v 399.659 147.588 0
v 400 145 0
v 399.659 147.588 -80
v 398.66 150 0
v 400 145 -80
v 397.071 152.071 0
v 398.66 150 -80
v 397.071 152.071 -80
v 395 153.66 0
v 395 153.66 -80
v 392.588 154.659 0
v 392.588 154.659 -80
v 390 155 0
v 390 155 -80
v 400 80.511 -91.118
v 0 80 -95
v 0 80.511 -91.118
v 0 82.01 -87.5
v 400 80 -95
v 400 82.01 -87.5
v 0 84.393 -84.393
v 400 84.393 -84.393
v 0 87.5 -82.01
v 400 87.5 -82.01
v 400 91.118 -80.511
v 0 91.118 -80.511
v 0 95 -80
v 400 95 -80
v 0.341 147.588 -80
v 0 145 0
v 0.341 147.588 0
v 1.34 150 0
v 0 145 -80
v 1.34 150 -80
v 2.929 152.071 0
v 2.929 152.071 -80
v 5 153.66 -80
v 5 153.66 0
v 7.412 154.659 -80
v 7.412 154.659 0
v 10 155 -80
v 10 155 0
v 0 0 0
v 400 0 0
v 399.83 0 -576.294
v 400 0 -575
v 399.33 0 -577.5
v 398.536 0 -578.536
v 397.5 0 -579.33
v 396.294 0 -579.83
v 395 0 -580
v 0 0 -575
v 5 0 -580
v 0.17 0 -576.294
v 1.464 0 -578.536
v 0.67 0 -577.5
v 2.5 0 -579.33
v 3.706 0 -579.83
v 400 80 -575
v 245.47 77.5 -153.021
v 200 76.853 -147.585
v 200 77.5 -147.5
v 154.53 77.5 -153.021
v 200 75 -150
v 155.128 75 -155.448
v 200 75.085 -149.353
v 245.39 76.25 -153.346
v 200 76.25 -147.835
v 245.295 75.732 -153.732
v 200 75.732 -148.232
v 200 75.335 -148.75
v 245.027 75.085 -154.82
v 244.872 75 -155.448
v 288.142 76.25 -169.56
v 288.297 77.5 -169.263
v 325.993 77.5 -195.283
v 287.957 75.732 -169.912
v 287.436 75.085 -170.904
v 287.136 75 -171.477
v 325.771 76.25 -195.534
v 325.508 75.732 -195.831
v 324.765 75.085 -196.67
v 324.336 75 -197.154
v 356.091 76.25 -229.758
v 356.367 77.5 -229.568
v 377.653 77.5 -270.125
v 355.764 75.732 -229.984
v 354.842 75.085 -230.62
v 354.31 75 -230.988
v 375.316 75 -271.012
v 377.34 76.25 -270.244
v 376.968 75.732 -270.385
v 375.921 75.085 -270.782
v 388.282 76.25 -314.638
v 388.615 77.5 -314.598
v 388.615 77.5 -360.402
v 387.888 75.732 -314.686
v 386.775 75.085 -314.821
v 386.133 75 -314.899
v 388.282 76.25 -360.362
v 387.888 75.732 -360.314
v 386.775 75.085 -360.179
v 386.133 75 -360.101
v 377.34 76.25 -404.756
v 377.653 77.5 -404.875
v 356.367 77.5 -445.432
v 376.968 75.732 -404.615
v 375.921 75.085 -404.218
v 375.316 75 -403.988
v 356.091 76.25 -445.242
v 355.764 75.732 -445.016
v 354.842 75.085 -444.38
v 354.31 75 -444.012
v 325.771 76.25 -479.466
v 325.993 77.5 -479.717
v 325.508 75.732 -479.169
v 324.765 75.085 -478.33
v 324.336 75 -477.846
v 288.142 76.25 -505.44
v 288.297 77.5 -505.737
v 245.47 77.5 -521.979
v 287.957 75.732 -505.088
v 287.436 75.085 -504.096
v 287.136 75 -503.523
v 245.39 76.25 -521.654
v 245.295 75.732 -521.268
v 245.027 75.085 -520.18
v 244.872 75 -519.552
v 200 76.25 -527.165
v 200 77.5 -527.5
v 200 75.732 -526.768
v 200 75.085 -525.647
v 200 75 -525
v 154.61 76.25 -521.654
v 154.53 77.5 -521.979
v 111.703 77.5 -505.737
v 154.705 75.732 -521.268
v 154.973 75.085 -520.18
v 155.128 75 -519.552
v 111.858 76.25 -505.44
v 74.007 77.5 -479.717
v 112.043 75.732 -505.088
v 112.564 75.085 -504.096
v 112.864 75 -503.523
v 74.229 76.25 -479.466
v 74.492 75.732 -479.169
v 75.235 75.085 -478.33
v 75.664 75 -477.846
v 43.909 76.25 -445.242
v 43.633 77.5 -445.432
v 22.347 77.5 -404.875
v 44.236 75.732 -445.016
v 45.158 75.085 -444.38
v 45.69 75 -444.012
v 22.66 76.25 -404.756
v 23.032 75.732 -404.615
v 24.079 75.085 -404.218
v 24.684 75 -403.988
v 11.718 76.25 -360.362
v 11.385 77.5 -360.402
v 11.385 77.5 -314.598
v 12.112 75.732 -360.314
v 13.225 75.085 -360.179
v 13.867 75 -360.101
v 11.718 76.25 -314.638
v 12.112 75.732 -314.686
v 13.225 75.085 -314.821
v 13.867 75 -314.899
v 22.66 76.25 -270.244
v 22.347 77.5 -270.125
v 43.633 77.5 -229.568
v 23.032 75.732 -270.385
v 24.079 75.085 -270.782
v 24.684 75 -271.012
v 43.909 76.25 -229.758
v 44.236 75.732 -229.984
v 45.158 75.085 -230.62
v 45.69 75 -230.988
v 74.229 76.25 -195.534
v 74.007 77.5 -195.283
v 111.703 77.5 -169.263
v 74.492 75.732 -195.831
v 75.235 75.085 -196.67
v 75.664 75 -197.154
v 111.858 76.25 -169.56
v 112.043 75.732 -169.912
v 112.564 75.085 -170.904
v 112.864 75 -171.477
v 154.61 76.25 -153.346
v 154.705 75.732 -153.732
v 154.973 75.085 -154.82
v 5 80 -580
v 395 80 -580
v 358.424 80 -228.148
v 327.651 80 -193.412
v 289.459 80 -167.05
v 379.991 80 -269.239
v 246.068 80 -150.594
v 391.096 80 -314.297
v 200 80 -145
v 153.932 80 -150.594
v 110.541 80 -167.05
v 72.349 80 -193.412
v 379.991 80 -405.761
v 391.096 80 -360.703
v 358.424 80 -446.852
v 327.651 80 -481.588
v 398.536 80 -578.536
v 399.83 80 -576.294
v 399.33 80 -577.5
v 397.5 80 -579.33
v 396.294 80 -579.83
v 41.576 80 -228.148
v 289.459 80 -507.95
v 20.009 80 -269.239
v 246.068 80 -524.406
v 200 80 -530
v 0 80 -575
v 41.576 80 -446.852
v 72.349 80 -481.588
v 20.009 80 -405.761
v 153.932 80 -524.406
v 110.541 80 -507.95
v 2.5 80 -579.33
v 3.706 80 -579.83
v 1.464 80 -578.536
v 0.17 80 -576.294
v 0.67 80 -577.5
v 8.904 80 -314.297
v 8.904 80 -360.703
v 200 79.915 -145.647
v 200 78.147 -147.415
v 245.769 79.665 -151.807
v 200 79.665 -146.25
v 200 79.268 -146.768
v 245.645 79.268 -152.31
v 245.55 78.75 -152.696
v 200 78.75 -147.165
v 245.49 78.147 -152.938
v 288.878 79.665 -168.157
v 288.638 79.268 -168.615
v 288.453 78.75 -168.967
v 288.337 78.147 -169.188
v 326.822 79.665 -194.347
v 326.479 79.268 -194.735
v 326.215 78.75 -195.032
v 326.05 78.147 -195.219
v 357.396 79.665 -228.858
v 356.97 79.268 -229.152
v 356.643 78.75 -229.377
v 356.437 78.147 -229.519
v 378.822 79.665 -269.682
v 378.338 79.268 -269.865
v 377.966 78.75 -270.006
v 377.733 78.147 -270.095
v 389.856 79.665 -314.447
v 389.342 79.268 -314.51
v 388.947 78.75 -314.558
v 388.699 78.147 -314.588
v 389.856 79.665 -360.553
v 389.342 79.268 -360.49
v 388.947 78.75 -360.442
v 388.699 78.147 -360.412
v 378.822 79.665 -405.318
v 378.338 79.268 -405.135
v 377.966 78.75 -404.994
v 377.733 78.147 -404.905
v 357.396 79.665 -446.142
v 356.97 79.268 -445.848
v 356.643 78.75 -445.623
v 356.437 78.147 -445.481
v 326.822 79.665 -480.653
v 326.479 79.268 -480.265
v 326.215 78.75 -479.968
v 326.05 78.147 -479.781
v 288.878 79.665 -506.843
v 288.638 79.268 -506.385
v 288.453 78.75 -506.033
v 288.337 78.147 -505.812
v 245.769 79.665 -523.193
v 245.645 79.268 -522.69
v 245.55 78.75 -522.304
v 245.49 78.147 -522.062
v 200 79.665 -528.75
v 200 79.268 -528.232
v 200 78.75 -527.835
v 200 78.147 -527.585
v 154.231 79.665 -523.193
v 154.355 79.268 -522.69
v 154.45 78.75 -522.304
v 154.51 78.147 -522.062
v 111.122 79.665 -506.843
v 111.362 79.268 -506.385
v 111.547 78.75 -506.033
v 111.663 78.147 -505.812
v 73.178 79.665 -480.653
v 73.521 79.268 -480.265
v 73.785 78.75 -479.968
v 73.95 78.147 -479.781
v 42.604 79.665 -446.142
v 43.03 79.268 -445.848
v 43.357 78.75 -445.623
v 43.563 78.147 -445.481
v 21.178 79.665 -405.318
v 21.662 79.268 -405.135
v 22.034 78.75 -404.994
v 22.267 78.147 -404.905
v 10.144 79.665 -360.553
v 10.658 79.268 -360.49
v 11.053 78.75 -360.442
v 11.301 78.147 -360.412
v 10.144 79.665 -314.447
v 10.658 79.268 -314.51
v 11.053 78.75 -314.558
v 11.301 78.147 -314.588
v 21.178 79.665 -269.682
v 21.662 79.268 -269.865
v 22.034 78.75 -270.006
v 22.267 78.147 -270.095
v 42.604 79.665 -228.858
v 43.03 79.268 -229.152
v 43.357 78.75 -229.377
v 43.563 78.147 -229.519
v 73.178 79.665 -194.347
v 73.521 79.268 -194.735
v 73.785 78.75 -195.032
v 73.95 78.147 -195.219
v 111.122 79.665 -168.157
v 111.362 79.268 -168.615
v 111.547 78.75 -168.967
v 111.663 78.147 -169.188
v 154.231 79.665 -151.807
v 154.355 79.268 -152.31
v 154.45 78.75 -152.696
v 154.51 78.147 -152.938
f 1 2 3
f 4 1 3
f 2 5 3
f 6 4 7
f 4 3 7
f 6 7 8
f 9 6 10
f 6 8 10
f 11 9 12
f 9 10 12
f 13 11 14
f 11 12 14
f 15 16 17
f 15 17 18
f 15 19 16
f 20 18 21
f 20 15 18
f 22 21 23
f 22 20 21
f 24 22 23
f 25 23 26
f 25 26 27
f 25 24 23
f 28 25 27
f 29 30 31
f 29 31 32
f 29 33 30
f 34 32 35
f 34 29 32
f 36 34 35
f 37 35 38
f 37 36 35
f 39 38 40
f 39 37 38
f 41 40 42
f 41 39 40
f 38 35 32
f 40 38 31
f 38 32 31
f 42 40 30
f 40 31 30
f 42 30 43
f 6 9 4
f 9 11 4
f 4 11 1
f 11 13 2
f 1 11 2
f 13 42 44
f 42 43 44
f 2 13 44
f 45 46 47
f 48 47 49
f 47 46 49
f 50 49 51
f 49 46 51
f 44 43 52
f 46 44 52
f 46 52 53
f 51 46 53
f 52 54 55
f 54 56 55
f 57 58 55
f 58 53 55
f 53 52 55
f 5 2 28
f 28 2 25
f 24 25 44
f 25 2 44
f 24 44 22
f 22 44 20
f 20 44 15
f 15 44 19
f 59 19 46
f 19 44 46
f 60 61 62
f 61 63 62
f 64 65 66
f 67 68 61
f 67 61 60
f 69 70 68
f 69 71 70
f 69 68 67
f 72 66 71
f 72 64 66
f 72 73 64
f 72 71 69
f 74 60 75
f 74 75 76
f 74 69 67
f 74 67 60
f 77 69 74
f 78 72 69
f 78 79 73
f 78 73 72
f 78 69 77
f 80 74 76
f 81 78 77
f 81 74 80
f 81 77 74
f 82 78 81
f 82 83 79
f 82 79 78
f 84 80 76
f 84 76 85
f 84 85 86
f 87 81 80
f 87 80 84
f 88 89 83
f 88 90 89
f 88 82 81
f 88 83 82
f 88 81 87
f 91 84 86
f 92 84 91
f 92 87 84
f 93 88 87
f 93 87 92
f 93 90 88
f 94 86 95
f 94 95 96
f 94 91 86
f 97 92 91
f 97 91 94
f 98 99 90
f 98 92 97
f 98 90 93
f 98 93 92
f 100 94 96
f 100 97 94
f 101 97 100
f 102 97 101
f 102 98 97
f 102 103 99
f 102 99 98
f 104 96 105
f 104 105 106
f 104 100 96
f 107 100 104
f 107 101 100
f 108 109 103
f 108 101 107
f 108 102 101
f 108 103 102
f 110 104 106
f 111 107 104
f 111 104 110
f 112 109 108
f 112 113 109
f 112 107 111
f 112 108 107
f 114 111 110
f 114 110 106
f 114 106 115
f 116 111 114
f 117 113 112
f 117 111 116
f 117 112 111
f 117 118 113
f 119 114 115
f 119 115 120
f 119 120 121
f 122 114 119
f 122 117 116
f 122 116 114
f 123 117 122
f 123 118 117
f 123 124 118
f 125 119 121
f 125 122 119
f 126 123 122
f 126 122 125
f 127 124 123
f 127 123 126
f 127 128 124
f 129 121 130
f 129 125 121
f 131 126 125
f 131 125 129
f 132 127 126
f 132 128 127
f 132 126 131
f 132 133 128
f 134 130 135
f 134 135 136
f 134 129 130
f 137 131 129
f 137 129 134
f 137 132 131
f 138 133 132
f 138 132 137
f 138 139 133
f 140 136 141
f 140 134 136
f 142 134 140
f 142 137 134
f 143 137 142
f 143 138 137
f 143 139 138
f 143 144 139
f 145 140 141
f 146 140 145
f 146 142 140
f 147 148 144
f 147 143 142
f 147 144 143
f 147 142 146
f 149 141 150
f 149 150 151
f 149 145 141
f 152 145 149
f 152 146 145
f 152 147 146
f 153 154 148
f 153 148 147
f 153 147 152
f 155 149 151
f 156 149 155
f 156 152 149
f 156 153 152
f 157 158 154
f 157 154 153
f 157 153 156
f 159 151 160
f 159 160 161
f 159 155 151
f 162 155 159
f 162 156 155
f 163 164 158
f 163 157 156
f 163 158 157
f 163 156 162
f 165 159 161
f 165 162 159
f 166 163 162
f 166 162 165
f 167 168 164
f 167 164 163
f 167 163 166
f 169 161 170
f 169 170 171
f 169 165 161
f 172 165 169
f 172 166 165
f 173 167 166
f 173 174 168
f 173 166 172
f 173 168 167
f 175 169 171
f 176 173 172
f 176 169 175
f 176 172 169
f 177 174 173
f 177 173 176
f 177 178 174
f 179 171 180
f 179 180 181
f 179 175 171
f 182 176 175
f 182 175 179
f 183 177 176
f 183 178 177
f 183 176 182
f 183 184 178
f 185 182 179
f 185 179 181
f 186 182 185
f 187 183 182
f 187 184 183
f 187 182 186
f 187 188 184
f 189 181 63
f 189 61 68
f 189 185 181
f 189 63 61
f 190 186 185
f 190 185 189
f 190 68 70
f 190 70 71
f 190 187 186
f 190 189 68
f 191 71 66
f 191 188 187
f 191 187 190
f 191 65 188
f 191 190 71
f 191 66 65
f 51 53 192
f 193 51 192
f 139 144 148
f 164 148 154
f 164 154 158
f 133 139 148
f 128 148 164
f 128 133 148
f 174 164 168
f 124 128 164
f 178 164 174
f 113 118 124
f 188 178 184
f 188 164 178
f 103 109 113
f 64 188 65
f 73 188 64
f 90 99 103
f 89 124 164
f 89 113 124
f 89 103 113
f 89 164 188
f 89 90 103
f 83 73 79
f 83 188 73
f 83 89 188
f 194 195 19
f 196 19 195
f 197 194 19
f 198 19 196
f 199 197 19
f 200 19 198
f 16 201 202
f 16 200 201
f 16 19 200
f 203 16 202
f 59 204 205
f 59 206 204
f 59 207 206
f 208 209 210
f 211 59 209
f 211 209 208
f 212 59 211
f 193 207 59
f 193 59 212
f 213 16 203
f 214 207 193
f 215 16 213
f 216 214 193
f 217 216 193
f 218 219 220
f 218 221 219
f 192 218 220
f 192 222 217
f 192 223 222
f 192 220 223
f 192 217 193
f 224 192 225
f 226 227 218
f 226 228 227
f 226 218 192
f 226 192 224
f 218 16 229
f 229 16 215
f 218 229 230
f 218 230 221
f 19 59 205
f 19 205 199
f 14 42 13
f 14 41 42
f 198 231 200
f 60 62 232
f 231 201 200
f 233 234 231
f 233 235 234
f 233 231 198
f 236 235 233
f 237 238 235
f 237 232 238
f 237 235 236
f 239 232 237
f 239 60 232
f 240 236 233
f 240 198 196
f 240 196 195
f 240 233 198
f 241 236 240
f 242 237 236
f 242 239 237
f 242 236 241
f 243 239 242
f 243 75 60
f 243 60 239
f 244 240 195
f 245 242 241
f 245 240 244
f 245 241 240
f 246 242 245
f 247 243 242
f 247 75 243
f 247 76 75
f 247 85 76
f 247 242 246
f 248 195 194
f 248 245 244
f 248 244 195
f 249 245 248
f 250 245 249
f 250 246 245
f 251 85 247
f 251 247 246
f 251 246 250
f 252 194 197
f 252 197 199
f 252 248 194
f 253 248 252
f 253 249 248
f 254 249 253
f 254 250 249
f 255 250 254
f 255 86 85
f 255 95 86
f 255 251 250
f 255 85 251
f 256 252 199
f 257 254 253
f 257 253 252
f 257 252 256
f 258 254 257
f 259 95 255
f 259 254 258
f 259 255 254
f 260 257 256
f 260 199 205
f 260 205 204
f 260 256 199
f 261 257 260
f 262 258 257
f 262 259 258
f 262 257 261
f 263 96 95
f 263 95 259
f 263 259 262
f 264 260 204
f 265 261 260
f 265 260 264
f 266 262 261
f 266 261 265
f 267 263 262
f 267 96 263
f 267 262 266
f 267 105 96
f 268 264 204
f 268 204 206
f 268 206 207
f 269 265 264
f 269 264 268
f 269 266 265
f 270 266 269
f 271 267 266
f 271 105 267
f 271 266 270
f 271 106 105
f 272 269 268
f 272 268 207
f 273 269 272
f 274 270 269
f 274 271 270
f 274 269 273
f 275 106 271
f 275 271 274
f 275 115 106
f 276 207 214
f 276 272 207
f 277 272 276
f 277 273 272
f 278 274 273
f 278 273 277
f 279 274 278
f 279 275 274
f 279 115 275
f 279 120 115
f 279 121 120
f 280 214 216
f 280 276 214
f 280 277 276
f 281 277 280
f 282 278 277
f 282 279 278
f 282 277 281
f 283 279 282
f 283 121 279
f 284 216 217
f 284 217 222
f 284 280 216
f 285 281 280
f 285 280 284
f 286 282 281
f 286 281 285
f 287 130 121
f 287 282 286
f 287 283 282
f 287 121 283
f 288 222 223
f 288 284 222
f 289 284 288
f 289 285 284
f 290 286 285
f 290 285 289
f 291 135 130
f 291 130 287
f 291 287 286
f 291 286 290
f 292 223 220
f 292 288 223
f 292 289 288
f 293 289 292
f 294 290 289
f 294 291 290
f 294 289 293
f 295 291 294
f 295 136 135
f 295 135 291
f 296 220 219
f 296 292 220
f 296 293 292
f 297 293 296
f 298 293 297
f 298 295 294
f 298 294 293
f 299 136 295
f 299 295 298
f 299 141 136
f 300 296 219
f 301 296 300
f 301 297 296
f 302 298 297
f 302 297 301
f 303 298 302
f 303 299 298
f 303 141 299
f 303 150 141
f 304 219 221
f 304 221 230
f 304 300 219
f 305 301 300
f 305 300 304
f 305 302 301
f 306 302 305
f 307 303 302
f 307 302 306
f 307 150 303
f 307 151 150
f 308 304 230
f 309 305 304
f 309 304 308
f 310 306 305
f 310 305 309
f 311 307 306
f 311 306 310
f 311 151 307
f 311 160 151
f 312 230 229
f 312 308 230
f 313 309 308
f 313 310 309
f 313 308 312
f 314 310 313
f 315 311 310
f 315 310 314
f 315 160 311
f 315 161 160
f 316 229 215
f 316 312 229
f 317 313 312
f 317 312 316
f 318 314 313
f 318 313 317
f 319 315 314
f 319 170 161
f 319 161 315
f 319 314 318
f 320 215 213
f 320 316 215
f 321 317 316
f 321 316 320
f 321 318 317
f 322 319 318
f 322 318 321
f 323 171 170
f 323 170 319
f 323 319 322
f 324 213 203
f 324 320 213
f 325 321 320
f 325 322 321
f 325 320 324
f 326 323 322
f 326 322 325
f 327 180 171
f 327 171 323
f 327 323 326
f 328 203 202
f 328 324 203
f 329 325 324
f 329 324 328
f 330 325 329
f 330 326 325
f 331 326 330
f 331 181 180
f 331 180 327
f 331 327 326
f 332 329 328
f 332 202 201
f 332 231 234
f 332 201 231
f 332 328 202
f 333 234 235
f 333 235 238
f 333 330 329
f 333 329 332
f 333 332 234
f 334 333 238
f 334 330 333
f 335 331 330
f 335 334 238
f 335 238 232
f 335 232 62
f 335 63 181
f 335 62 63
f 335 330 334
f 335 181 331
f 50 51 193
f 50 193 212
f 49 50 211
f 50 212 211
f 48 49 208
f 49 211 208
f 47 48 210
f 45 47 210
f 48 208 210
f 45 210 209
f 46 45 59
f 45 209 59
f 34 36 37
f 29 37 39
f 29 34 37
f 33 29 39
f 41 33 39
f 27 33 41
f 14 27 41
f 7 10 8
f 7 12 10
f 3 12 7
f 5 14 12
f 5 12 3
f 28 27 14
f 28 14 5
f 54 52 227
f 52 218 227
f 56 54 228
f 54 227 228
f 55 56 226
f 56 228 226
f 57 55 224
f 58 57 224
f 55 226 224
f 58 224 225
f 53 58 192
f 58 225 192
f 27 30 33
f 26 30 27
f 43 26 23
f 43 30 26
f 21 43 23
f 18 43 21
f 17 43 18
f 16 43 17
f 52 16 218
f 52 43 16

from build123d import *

# Parameters (mm, degrees)
SKETCH1_W           = 580
SKETCH1_H           = 80
BOSS_EXTRUDE1_DEPTH = 400
SKETCH2_W           = 400
SKETCH2_H           = 80
BOSS_EXTRUDE2_DEPTH = 75
FILLET2_R           = 10
FILLET3_R           = 5
FILLET4_R           = 15
SKETCH3_R           = 190
CUT_EXTRUDE1_DEPTH  = 5
FILLET6_R           = 2.5


with BuildPart() as part:
    # Sketch1 → Boss-Extrude1 (new body)
    with BuildSketch(Plane(origin=(0, 0, 0), x_dir=(0, 0, -1), z_dir=(1, 0, 0))):
        with Locations((290, 40)):
            Rectangle(SKETCH1_W, SKETCH1_H)
    extrude(amount=BOSS_EXTRUDE1_DEPTH)

    # Sketch2 → Boss-Extrude2 (add)
    with BuildSketch(Plane(origin=(0, 80, 0), x_dir=(1, 0, 0), z_dir=(0, 1, 0))):
        with Locations((200, 40)):
            Rectangle(SKETCH2_W, SKETCH2_H)
    extrude(amount=BOSS_EXTRUDE2_DEPTH)

    # Fillet2
    fillet2_edges = [part.edges().sort_by_distance(p)[0] for p in [
        (0, 155, -40),
        (400, 155, -40),
    ]]
    fillet(fillet2_edges, radius=FILLET2_R)

    # Fillet3
    fillet3_edges = [part.edges().sort_by_distance(p)[0] for p in [
        (400, 40, -580),
        (0, 40, -580),
    ]]
    fillet(fillet3_edges, radius=FILLET3_R)

    # Fillet4
    fillet4_edges = [part.edges().sort_by_distance(p)[0] for p in [
        (200, 80, -80),
    ]]
    fillet(fillet4_edges, radius=FILLET4_R)

    # Sketch3 → Cut-Extrude1 (cut)
    with BuildSketch(Plane(origin=(0, 80, 0), x_dir=(1, 0, 0), z_dir=(0, 1, 0))):
        with Locations(Location((200, 337.5, 0), (0, 0, 270))):
            Circle(SKETCH3_R)
    extrude(amount=-CUT_EXTRUDE1_DEPTH, mode=Mode.SUBTRACT)

    # Fillet6
    fillet6_edges = [part.edges().sort_by_distance(p)[0] for p in [
        (200, 75, -527.5),
        (200, 80, -527.5),
    ]]
    fillet(fillet6_edges, radius=FILLET6_R - 0.0001)  # a hair under: the kernel refuses the full size


solid = part.part
